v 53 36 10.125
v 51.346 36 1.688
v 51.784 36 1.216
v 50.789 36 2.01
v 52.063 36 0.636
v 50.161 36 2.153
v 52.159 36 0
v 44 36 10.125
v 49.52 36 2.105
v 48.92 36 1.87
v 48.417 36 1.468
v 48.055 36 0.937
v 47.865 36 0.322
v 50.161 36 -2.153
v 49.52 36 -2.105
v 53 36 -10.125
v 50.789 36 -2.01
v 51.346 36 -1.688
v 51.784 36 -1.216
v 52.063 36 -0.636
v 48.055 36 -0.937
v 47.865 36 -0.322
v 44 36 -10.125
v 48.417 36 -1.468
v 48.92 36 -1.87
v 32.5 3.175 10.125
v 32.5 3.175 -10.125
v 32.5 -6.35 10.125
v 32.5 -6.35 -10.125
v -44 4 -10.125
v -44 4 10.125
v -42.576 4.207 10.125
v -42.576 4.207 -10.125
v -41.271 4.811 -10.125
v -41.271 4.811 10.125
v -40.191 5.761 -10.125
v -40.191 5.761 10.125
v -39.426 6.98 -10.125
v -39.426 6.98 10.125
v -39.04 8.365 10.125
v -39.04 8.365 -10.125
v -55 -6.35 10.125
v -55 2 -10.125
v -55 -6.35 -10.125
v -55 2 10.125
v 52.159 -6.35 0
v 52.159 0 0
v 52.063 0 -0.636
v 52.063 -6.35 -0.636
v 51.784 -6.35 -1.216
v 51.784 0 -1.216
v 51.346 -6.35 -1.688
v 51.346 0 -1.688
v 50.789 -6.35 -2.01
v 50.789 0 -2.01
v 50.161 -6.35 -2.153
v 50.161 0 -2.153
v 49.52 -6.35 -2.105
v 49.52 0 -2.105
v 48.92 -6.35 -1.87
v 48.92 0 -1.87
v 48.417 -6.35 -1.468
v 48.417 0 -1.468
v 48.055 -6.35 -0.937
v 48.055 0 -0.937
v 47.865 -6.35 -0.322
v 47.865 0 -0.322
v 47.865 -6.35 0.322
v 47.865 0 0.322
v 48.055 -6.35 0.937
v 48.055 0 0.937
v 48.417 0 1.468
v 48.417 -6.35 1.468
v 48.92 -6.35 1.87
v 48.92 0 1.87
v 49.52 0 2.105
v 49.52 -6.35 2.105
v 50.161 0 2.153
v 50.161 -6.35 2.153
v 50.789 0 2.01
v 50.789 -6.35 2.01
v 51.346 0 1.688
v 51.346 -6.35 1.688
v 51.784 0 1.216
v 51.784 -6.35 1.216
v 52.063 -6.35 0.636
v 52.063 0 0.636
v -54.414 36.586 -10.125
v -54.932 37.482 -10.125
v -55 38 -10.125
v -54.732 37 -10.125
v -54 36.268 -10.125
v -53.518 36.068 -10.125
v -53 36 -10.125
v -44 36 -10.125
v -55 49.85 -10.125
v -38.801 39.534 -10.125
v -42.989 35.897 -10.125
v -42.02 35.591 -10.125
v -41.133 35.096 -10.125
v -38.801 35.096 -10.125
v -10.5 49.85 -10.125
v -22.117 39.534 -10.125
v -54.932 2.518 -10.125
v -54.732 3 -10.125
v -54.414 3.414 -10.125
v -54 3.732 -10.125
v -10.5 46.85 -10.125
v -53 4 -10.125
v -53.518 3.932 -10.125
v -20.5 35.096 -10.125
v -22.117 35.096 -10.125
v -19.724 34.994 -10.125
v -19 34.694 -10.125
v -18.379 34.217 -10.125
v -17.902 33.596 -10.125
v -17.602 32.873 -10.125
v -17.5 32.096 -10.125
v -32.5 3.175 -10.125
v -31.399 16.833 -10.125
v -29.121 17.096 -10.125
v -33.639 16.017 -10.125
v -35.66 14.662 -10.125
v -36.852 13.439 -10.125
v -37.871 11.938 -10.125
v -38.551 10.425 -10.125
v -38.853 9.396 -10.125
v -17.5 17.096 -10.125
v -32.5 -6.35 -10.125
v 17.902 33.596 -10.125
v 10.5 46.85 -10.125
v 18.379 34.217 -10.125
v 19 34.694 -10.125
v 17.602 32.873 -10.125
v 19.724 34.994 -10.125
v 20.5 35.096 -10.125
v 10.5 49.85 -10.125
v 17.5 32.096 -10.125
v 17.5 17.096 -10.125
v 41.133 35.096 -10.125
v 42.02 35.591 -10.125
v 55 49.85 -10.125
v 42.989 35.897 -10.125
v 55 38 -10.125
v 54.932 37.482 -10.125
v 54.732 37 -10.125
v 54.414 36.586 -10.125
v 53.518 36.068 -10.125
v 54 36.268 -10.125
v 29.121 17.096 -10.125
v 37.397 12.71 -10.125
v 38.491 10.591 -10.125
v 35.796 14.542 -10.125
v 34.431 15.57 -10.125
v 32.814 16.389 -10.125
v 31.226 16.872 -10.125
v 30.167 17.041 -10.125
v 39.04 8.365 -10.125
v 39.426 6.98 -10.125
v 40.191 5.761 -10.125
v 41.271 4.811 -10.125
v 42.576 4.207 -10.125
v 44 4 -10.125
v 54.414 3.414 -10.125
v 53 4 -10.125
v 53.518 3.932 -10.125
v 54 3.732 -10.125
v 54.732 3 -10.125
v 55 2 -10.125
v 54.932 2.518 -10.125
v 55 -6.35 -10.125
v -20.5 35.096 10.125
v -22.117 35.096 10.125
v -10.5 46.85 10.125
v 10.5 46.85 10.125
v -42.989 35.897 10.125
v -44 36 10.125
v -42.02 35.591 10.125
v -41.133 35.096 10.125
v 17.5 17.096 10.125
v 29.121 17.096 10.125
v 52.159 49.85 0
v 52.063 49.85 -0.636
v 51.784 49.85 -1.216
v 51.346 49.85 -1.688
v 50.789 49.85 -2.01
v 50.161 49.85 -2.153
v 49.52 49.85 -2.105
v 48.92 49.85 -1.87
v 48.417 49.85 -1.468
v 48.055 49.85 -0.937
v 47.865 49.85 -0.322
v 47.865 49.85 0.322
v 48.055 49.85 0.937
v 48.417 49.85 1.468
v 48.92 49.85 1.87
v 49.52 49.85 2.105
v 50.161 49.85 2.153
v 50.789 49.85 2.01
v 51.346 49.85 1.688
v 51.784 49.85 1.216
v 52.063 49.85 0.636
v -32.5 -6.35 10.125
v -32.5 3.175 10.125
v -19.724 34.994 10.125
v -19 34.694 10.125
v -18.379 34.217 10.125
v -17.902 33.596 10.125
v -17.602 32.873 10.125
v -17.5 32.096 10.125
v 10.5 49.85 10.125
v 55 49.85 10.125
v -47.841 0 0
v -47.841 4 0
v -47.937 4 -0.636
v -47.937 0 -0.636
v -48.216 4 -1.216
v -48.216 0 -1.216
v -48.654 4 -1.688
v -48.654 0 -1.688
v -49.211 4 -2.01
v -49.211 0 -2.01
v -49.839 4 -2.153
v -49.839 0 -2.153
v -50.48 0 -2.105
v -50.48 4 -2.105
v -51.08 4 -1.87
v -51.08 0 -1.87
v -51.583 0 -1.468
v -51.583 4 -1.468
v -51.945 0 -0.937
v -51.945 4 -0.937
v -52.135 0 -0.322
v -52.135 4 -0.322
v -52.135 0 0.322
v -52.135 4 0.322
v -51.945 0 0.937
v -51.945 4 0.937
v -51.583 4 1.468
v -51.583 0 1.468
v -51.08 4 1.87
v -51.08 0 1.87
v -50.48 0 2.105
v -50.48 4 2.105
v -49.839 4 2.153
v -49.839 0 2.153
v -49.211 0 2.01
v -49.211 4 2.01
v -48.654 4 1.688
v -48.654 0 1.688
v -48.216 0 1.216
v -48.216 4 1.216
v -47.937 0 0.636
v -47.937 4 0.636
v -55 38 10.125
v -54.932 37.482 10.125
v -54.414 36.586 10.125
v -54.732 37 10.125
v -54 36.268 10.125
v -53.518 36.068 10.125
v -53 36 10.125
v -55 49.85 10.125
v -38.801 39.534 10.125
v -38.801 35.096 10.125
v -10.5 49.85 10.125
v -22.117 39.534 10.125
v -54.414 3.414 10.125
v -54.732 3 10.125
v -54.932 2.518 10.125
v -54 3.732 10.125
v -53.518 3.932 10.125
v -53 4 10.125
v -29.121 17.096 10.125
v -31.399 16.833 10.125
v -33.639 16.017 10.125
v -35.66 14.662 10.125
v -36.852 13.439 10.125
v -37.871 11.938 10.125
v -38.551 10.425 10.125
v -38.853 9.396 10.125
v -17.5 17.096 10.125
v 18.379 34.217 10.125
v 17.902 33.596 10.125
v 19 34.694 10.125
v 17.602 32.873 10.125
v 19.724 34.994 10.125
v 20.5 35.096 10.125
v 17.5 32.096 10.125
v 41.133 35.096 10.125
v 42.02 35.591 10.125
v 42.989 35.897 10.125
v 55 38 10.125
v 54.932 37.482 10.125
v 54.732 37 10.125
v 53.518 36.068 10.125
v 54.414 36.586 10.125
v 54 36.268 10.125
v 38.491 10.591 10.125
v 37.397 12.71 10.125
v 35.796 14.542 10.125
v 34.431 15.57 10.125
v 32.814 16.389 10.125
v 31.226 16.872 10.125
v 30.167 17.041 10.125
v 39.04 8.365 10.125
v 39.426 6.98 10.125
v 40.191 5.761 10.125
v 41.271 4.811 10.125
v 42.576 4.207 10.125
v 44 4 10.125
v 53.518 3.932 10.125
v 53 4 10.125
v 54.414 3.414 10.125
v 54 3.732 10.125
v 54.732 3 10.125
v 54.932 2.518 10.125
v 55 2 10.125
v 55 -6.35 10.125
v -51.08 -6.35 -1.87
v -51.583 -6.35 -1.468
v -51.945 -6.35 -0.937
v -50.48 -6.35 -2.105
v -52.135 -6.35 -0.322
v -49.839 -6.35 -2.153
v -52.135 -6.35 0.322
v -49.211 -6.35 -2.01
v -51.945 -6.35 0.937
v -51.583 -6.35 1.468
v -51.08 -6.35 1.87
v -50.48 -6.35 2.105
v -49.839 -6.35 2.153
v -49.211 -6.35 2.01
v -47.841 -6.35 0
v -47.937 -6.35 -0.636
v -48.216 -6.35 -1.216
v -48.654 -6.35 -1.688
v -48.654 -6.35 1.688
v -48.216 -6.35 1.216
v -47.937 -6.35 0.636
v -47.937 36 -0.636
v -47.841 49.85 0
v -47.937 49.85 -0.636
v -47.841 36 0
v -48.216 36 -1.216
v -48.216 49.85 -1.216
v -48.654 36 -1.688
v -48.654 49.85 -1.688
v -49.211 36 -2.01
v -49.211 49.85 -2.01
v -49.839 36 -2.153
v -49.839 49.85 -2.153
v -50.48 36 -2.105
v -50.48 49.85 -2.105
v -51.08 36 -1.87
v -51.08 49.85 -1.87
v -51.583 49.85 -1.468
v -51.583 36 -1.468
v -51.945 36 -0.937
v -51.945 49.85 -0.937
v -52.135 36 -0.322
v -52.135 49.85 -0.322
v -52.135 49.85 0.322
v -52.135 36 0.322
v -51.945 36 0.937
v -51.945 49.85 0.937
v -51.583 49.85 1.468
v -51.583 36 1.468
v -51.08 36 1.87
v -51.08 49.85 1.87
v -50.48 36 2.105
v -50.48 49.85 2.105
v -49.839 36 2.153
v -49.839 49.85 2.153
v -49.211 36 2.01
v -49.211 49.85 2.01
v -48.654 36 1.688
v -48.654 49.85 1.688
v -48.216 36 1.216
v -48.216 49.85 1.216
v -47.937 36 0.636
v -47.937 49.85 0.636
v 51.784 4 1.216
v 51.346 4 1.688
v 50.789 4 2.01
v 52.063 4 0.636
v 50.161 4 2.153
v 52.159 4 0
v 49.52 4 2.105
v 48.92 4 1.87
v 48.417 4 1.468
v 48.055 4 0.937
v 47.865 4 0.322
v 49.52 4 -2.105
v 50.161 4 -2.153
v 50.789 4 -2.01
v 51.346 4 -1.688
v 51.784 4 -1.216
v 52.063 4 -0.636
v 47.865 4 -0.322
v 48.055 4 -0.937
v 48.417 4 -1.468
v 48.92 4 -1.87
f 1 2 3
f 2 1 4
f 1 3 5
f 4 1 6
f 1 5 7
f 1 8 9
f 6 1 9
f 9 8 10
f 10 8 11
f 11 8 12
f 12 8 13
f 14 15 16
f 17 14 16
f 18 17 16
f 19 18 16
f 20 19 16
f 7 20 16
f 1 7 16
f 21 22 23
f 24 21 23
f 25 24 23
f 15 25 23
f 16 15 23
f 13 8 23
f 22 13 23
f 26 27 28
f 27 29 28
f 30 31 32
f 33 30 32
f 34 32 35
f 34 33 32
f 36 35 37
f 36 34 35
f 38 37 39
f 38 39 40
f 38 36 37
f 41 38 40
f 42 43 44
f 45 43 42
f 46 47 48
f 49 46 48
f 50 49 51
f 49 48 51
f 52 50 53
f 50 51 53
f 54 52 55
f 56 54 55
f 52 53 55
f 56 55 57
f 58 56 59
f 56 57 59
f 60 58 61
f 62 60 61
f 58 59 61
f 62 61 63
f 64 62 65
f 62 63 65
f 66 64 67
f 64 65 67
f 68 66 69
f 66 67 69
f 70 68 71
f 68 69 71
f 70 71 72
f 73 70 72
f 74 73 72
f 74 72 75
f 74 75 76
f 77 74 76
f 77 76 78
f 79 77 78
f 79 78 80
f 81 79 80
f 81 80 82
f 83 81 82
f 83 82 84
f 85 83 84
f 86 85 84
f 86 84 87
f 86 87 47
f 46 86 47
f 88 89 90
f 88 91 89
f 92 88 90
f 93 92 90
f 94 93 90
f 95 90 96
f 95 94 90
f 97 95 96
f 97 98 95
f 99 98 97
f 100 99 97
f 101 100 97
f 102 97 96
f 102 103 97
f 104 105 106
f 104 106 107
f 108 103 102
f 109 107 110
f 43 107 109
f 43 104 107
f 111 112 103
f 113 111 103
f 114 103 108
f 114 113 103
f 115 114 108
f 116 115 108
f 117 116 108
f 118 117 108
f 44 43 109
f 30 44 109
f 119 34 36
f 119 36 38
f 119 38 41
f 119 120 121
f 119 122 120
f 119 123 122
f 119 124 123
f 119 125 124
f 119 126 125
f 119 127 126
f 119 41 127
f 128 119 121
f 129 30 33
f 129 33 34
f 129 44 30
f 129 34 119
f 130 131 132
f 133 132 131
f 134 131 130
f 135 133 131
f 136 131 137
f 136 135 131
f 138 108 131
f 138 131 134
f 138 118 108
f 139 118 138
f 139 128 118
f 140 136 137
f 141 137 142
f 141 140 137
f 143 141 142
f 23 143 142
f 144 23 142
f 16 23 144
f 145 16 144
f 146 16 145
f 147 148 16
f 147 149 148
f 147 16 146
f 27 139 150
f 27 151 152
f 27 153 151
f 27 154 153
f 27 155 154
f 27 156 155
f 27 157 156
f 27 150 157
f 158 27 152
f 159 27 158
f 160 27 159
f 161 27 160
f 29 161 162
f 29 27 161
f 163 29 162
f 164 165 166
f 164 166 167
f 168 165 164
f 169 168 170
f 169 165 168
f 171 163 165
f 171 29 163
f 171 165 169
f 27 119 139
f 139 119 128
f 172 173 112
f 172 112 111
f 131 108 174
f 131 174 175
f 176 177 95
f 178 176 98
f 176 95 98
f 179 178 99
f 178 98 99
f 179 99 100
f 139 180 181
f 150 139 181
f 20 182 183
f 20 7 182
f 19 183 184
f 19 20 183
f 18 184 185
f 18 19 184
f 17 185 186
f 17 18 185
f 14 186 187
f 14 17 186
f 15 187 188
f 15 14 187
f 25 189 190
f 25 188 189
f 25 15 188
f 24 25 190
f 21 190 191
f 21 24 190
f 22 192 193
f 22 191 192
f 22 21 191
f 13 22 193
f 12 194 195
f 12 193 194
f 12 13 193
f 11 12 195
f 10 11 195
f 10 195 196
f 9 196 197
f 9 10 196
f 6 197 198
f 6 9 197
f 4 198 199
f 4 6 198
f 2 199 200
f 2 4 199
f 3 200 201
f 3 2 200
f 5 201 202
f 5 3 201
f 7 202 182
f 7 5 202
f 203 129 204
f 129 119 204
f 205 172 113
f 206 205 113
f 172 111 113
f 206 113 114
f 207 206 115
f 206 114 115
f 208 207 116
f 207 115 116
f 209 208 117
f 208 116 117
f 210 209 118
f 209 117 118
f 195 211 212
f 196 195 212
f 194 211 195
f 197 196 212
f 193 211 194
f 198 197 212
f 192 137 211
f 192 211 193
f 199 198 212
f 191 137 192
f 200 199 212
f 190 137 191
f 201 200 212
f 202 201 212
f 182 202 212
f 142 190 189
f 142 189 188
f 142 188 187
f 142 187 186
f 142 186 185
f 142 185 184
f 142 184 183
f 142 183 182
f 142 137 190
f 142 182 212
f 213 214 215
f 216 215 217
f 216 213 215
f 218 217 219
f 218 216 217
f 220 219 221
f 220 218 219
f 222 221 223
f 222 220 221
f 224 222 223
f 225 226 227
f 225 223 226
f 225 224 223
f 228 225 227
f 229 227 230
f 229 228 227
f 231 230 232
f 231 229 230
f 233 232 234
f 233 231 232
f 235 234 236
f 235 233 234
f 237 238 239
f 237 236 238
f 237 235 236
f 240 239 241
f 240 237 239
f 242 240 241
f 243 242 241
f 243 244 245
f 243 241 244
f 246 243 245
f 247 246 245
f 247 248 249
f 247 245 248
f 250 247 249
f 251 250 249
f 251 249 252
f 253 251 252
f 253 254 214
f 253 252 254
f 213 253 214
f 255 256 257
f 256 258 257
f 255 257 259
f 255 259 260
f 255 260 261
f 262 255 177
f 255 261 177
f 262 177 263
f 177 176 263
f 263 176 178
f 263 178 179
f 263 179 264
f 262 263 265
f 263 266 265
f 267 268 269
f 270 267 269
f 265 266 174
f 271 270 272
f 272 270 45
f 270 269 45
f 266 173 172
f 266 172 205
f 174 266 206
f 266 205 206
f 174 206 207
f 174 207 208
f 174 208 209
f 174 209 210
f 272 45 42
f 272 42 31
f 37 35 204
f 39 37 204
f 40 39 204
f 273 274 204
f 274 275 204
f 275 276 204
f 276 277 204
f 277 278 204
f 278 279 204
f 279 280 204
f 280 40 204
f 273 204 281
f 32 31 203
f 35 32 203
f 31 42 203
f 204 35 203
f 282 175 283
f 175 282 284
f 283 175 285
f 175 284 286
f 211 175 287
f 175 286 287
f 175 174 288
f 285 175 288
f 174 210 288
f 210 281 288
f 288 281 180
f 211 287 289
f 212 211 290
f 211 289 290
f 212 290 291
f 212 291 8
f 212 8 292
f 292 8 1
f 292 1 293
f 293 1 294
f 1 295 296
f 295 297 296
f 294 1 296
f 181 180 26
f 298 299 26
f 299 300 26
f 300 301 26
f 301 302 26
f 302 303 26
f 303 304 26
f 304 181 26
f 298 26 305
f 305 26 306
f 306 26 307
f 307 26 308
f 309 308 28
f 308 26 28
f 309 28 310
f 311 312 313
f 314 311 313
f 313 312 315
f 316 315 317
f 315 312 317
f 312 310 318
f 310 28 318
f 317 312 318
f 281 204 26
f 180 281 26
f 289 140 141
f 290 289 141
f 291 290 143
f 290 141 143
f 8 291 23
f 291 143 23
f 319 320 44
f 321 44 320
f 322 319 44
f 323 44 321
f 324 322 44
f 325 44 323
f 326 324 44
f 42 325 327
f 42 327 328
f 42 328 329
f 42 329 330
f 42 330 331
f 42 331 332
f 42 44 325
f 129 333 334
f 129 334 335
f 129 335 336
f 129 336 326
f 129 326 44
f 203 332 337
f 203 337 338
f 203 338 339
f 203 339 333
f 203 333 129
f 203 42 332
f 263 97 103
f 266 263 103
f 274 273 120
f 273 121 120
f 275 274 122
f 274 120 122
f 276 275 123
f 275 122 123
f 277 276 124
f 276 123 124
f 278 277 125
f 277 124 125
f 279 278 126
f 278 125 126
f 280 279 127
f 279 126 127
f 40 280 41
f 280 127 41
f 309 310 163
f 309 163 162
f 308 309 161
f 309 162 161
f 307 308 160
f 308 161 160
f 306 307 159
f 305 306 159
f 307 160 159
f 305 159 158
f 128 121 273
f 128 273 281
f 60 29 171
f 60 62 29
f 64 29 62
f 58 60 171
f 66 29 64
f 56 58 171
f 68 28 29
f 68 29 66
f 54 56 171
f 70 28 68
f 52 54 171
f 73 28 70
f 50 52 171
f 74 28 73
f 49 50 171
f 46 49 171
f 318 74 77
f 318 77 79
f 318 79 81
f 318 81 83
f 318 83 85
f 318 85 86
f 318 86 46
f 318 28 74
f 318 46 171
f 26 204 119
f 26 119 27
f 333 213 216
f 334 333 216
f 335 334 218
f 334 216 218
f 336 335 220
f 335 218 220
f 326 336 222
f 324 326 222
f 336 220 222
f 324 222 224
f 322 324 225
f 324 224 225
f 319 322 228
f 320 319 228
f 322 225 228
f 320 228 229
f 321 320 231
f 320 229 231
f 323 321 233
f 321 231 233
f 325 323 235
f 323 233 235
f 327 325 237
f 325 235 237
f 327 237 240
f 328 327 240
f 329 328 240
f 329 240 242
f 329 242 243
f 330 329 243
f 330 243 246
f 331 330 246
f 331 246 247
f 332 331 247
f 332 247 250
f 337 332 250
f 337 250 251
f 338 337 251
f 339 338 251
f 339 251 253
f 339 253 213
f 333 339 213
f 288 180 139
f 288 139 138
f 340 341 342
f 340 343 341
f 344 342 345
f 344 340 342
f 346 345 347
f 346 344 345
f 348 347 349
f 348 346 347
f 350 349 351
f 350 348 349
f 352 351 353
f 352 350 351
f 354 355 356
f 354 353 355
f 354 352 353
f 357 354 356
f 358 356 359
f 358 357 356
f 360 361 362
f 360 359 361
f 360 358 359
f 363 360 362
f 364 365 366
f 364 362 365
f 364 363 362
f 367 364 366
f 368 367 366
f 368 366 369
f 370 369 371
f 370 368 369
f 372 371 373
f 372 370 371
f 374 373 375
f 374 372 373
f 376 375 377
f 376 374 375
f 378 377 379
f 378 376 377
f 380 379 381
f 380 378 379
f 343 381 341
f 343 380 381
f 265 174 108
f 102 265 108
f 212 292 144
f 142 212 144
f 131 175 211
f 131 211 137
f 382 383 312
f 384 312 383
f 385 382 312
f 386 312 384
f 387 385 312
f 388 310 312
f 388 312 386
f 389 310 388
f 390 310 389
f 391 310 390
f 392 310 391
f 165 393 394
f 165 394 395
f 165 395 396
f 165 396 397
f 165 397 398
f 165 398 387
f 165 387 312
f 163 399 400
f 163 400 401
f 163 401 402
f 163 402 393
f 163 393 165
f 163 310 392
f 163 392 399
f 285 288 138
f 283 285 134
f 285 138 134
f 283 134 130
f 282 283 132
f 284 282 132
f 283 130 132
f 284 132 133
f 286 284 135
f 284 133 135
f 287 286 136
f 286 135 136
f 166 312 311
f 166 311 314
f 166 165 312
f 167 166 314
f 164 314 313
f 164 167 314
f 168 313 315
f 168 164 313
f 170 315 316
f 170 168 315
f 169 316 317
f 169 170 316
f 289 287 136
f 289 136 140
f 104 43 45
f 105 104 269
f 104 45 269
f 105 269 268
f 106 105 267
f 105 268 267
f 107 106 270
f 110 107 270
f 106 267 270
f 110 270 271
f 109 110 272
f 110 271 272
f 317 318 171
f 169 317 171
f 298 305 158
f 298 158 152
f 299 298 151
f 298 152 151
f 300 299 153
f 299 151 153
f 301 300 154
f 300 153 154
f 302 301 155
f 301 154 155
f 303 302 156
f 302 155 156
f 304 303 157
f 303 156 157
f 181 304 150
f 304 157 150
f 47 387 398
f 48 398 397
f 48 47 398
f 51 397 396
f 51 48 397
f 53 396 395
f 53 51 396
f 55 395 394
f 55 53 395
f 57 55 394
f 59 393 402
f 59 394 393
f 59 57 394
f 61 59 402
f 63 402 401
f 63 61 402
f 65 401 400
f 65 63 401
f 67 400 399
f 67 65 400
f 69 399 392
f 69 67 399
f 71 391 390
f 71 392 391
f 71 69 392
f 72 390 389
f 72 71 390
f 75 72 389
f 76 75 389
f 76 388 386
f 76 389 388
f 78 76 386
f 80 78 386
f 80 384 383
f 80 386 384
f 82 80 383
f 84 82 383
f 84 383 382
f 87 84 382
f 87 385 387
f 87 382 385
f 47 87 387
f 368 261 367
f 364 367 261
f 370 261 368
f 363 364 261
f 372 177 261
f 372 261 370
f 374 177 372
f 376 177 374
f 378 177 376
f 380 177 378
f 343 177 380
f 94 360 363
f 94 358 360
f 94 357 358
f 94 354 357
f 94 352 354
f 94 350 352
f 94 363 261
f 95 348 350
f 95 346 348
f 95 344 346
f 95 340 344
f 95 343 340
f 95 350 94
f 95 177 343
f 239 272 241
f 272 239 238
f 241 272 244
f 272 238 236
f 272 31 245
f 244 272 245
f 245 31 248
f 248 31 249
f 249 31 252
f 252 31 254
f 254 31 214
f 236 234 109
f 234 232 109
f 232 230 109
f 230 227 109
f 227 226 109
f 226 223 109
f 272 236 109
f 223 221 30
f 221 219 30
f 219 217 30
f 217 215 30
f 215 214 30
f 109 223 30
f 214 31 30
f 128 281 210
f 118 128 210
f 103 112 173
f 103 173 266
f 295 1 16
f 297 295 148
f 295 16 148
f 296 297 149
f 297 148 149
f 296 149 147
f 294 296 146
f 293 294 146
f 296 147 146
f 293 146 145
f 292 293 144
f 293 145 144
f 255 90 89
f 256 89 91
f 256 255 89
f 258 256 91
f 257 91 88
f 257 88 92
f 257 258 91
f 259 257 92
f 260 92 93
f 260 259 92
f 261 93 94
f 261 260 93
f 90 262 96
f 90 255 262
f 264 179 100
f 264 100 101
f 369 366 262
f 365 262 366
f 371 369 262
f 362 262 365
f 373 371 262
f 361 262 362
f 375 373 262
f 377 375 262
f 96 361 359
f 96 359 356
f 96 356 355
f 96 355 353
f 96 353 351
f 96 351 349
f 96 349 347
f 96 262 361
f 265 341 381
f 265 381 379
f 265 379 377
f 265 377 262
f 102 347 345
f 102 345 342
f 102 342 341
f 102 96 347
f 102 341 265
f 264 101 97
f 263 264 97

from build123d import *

# Parameters (mm, degrees)
SKETCH1_W                = 110
SKETCH1_H                = 20.25
SKETCH1_R                = 2.159
BOSS_EXTRUDE1_DEPTH      = 43.175
CUT_EXTRUDE3_START       = 39
SKETCH2_W                = 74.945935845
SKETCH2_H                = 32
CUT_EXTRUDE3_DEPTH       = 32.651229643
CUT_EXTRUDE4_START       = -39
SKETCH2_3_W              = 74.945935845
SKETCH2_3_H              = 32
CUT_EXTRUDE4_DEPTH       = 32.651229643
FILLET1_R                = 5
FILLET2_R                = 2
SKETCH10_W               = 65
SKETCH10_H               = 20.25
CUT_EXTRUDE8_DEPTH       = 3.175
SKETCH11_W               = 30
SKETCH11_H               = 18
SKETCH11_W_2             = 29.367311722
CUT_EXTRUDE9_DEPTH       = 73.795213613
FILLET3_R                = 10
FILLET5_R                = 3
SKETCH16_W               = 22.5
SKETCH16_H               = 20.25
BOSS_EXTRUDE4_DEPTH      = 6.35
SKETCH13_W               = 110
SKETCH13_H               = 20.25
BOSS_EXTRUDE5_DEPTH      = 3.675
SKETCH19_W               = 44.5
SKETCH19_H               = 20.25
BOSS_EXTRUDE6_DEPTH      = 3
CUT_EXTRUDE10_DEPTH      = 73.316928497
CUT_EXTRUDE10_DEPTH_BACK = 73.316928497
SKETCH20_R               = 2.159
SKETCH21_W               = 16.684617085
SKETCH21_H               = 4.437831476
CUT_EXTRUDE11_DEPTH      = 77.942088775


with BuildPart() as part:
    # Sketch1 → Boss-Extrude1 (new body)
    with BuildSketch(Plane(origin=(0, 0, 0), x_dir=(1, 0, 0), z_dir=(0, 1, 0))):
        Rectangle(SKETCH1_W, SKETCH1_H)
        with Locations((-50, 0)):
            Circle(SKETCH1_R, mode=Mode.SUBTRACT)
        with Locations((50, 0)):
            Circle(SKETCH1_R, mode=Mode.SUBTRACT)
    extrude(amount=BOSS_EXTRUDE1_DEPTH)

    # Sketch2 → Cut-Extrude3 (cut, through all)
    with BuildSketch(Plane(origin=(0, 0, 0), x_dir=(0, 0, -1), z_dir=(1, 0, 0)).offset(CUT_EXTRUDE3_START)):
        with Locations((0.587900532, 20)):
            Rectangle(SKETCH2_W, SKETCH2_H)
    extrude(amount=CUT_EXTRUDE3_DEPTH, mode=Mode.SUBTRACT)

    # Sketch2<3> → Cut-Extrude4 (cut, through all)
    with BuildSketch(Plane(origin=(0, 0, 0), x_dir=(0, 0, -1), z_dir=(1, 0, 0)).offset(CUT_EXTRUDE4_START)):
        with Locations((0.587900532, 20)):
            Rectangle(SKETCH2_3_W, SKETCH2_3_H)
    extrude(amount=-CUT_EXTRUDE4_DEPTH, mode=Mode.SUBTRACT)

    # Fillet1
    fillet1_edges = [part.edges().sort_by_distance(p)[0] for p in [
        (-39, 36, 0),
        (-39, 4, 0),
        (39, 4, 0),
        (39, 36, 0),
    ]]
    fillet(fillet1_edges, radius=FILLET1_R)

    # Fillet2
    fillet2_edges = [part.edges().sort_by_distance(p)[0] for p in [
        (55, 4, 0),
        (55, 36, 0),
        (-55, 36, 0),
        (-55, 4, 0),
    ]]
    fillet(fillet2_edges, radius=FILLET2_R)

    # Sketch10 → Cut-Extrude8 (cut)
    with BuildSketch(Plane.XZ):
        Rectangle(SKETCH10_W, SKETCH10_H)
    extrude(amount=-CUT_EXTRUDE8_DEPTH, mode=Mode.SUBTRACT)

    # Sketch11 → Cut-Extrude9 (cut, through all)
    with BuildSketch(Plane.XY.offset(10.125)):
        with Locations((32.5, 26.096159603)):
            Rectangle(SKETCH11_W, SKETCH11_H)
        with Locations((-32.183655861, 26.096159603)):
            Rectangle(SKETCH11_W_2, SKETCH11_H)
    extrude(amount=-CUT_EXTRUDE9_DEPTH, mode=Mode.SUBTRACT)

    # Fillet3
    fillet3_edges = [part.edges().sort_by_distance(p)[0] for p in [
        (39, 17.096159603, 0),
        (-39, 17.096159603, 0),
    ]]
    fillet(fillet3_edges, radius=FILLET3_R)

    # Fillet5
    fillet5_edges = [part.edges().sort_by_distance(p)[0] for p in [
        (17.5, 35.096159603, 0),
        (-17.5, 35.096159603, 0),
    ]]
    fillet(fillet5_edges, radius=FILLET5_R)

    # Sketch16 → Boss-Extrude4 (add)
    with BuildSketch(Plane.XZ):
        with Locations((-43.75, 0)):
            Rectangle(SKETCH16_W, SKETCH16_H)
        with Locations((43.75, 0)):
            Rectangle(SKETCH16_W, SKETCH16_H)
    extrude(amount=BOSS_EXTRUDE4_DEPTH)

    # Sketch13 → Boss-Extrude5 (add)
    with BuildSketch(Plane(origin=(0, 43.175, 0), x_dir=(1, 0, 0), z_dir=(0, 1, 0))):
        Rectangle(SKETCH13_W, SKETCH13_H)
    extrude(amount=BOSS_EXTRUDE5_DEPTH)

    # Sketch19 → Boss-Extrude6 (add)
    with BuildSketch(Plane(origin=(0, 46.85, 0), x_dir=(1, 0, 0), z_dir=(0, 1, 0))):
        with Locations((-32.75, 0)):
            Rectangle(SKETCH19_W, SKETCH19_H)
        with Locations((32.75, 0)):
            Rectangle(SKETCH19_W, SKETCH19_H)
    extrude(amount=BOSS_EXTRUDE6_DEPTH)

    # Sketch20 → Cut-Extrude10 (cut, two sides: drawn at the far end of the back side and taken through both)
    with BuildSketch(Plane(origin=(0, 4, 0), x_dir=(1, 0, 0), z_dir=(0, 1, 0)).offset(-CUT_EXTRUDE10_DEPTH_BACK)):
        with Locations((-50, 0)):
            Circle(SKETCH20_R)
        with Locations((50, 0)):
            Circle(SKETCH20_R)
    extrude(amount=CUT_EXTRUDE10_DEPTH + CUT_EXTRUDE10_DEPTH_BACK, mode=Mode.SUBTRACT)

    # Sketch21 → Cut-Extrude11 (cut, through all)
    with BuildSketch(Plane.XY.offset(10.125)):
        with Locations((-30.45912654, 37.315075341)):
            Rectangle(SKETCH21_W, SKETCH21_H)
    extrude(amount=-CUT_EXTRUDE11_DEPTH, mode=Mode.SUBTRACT)


solid = part.part
